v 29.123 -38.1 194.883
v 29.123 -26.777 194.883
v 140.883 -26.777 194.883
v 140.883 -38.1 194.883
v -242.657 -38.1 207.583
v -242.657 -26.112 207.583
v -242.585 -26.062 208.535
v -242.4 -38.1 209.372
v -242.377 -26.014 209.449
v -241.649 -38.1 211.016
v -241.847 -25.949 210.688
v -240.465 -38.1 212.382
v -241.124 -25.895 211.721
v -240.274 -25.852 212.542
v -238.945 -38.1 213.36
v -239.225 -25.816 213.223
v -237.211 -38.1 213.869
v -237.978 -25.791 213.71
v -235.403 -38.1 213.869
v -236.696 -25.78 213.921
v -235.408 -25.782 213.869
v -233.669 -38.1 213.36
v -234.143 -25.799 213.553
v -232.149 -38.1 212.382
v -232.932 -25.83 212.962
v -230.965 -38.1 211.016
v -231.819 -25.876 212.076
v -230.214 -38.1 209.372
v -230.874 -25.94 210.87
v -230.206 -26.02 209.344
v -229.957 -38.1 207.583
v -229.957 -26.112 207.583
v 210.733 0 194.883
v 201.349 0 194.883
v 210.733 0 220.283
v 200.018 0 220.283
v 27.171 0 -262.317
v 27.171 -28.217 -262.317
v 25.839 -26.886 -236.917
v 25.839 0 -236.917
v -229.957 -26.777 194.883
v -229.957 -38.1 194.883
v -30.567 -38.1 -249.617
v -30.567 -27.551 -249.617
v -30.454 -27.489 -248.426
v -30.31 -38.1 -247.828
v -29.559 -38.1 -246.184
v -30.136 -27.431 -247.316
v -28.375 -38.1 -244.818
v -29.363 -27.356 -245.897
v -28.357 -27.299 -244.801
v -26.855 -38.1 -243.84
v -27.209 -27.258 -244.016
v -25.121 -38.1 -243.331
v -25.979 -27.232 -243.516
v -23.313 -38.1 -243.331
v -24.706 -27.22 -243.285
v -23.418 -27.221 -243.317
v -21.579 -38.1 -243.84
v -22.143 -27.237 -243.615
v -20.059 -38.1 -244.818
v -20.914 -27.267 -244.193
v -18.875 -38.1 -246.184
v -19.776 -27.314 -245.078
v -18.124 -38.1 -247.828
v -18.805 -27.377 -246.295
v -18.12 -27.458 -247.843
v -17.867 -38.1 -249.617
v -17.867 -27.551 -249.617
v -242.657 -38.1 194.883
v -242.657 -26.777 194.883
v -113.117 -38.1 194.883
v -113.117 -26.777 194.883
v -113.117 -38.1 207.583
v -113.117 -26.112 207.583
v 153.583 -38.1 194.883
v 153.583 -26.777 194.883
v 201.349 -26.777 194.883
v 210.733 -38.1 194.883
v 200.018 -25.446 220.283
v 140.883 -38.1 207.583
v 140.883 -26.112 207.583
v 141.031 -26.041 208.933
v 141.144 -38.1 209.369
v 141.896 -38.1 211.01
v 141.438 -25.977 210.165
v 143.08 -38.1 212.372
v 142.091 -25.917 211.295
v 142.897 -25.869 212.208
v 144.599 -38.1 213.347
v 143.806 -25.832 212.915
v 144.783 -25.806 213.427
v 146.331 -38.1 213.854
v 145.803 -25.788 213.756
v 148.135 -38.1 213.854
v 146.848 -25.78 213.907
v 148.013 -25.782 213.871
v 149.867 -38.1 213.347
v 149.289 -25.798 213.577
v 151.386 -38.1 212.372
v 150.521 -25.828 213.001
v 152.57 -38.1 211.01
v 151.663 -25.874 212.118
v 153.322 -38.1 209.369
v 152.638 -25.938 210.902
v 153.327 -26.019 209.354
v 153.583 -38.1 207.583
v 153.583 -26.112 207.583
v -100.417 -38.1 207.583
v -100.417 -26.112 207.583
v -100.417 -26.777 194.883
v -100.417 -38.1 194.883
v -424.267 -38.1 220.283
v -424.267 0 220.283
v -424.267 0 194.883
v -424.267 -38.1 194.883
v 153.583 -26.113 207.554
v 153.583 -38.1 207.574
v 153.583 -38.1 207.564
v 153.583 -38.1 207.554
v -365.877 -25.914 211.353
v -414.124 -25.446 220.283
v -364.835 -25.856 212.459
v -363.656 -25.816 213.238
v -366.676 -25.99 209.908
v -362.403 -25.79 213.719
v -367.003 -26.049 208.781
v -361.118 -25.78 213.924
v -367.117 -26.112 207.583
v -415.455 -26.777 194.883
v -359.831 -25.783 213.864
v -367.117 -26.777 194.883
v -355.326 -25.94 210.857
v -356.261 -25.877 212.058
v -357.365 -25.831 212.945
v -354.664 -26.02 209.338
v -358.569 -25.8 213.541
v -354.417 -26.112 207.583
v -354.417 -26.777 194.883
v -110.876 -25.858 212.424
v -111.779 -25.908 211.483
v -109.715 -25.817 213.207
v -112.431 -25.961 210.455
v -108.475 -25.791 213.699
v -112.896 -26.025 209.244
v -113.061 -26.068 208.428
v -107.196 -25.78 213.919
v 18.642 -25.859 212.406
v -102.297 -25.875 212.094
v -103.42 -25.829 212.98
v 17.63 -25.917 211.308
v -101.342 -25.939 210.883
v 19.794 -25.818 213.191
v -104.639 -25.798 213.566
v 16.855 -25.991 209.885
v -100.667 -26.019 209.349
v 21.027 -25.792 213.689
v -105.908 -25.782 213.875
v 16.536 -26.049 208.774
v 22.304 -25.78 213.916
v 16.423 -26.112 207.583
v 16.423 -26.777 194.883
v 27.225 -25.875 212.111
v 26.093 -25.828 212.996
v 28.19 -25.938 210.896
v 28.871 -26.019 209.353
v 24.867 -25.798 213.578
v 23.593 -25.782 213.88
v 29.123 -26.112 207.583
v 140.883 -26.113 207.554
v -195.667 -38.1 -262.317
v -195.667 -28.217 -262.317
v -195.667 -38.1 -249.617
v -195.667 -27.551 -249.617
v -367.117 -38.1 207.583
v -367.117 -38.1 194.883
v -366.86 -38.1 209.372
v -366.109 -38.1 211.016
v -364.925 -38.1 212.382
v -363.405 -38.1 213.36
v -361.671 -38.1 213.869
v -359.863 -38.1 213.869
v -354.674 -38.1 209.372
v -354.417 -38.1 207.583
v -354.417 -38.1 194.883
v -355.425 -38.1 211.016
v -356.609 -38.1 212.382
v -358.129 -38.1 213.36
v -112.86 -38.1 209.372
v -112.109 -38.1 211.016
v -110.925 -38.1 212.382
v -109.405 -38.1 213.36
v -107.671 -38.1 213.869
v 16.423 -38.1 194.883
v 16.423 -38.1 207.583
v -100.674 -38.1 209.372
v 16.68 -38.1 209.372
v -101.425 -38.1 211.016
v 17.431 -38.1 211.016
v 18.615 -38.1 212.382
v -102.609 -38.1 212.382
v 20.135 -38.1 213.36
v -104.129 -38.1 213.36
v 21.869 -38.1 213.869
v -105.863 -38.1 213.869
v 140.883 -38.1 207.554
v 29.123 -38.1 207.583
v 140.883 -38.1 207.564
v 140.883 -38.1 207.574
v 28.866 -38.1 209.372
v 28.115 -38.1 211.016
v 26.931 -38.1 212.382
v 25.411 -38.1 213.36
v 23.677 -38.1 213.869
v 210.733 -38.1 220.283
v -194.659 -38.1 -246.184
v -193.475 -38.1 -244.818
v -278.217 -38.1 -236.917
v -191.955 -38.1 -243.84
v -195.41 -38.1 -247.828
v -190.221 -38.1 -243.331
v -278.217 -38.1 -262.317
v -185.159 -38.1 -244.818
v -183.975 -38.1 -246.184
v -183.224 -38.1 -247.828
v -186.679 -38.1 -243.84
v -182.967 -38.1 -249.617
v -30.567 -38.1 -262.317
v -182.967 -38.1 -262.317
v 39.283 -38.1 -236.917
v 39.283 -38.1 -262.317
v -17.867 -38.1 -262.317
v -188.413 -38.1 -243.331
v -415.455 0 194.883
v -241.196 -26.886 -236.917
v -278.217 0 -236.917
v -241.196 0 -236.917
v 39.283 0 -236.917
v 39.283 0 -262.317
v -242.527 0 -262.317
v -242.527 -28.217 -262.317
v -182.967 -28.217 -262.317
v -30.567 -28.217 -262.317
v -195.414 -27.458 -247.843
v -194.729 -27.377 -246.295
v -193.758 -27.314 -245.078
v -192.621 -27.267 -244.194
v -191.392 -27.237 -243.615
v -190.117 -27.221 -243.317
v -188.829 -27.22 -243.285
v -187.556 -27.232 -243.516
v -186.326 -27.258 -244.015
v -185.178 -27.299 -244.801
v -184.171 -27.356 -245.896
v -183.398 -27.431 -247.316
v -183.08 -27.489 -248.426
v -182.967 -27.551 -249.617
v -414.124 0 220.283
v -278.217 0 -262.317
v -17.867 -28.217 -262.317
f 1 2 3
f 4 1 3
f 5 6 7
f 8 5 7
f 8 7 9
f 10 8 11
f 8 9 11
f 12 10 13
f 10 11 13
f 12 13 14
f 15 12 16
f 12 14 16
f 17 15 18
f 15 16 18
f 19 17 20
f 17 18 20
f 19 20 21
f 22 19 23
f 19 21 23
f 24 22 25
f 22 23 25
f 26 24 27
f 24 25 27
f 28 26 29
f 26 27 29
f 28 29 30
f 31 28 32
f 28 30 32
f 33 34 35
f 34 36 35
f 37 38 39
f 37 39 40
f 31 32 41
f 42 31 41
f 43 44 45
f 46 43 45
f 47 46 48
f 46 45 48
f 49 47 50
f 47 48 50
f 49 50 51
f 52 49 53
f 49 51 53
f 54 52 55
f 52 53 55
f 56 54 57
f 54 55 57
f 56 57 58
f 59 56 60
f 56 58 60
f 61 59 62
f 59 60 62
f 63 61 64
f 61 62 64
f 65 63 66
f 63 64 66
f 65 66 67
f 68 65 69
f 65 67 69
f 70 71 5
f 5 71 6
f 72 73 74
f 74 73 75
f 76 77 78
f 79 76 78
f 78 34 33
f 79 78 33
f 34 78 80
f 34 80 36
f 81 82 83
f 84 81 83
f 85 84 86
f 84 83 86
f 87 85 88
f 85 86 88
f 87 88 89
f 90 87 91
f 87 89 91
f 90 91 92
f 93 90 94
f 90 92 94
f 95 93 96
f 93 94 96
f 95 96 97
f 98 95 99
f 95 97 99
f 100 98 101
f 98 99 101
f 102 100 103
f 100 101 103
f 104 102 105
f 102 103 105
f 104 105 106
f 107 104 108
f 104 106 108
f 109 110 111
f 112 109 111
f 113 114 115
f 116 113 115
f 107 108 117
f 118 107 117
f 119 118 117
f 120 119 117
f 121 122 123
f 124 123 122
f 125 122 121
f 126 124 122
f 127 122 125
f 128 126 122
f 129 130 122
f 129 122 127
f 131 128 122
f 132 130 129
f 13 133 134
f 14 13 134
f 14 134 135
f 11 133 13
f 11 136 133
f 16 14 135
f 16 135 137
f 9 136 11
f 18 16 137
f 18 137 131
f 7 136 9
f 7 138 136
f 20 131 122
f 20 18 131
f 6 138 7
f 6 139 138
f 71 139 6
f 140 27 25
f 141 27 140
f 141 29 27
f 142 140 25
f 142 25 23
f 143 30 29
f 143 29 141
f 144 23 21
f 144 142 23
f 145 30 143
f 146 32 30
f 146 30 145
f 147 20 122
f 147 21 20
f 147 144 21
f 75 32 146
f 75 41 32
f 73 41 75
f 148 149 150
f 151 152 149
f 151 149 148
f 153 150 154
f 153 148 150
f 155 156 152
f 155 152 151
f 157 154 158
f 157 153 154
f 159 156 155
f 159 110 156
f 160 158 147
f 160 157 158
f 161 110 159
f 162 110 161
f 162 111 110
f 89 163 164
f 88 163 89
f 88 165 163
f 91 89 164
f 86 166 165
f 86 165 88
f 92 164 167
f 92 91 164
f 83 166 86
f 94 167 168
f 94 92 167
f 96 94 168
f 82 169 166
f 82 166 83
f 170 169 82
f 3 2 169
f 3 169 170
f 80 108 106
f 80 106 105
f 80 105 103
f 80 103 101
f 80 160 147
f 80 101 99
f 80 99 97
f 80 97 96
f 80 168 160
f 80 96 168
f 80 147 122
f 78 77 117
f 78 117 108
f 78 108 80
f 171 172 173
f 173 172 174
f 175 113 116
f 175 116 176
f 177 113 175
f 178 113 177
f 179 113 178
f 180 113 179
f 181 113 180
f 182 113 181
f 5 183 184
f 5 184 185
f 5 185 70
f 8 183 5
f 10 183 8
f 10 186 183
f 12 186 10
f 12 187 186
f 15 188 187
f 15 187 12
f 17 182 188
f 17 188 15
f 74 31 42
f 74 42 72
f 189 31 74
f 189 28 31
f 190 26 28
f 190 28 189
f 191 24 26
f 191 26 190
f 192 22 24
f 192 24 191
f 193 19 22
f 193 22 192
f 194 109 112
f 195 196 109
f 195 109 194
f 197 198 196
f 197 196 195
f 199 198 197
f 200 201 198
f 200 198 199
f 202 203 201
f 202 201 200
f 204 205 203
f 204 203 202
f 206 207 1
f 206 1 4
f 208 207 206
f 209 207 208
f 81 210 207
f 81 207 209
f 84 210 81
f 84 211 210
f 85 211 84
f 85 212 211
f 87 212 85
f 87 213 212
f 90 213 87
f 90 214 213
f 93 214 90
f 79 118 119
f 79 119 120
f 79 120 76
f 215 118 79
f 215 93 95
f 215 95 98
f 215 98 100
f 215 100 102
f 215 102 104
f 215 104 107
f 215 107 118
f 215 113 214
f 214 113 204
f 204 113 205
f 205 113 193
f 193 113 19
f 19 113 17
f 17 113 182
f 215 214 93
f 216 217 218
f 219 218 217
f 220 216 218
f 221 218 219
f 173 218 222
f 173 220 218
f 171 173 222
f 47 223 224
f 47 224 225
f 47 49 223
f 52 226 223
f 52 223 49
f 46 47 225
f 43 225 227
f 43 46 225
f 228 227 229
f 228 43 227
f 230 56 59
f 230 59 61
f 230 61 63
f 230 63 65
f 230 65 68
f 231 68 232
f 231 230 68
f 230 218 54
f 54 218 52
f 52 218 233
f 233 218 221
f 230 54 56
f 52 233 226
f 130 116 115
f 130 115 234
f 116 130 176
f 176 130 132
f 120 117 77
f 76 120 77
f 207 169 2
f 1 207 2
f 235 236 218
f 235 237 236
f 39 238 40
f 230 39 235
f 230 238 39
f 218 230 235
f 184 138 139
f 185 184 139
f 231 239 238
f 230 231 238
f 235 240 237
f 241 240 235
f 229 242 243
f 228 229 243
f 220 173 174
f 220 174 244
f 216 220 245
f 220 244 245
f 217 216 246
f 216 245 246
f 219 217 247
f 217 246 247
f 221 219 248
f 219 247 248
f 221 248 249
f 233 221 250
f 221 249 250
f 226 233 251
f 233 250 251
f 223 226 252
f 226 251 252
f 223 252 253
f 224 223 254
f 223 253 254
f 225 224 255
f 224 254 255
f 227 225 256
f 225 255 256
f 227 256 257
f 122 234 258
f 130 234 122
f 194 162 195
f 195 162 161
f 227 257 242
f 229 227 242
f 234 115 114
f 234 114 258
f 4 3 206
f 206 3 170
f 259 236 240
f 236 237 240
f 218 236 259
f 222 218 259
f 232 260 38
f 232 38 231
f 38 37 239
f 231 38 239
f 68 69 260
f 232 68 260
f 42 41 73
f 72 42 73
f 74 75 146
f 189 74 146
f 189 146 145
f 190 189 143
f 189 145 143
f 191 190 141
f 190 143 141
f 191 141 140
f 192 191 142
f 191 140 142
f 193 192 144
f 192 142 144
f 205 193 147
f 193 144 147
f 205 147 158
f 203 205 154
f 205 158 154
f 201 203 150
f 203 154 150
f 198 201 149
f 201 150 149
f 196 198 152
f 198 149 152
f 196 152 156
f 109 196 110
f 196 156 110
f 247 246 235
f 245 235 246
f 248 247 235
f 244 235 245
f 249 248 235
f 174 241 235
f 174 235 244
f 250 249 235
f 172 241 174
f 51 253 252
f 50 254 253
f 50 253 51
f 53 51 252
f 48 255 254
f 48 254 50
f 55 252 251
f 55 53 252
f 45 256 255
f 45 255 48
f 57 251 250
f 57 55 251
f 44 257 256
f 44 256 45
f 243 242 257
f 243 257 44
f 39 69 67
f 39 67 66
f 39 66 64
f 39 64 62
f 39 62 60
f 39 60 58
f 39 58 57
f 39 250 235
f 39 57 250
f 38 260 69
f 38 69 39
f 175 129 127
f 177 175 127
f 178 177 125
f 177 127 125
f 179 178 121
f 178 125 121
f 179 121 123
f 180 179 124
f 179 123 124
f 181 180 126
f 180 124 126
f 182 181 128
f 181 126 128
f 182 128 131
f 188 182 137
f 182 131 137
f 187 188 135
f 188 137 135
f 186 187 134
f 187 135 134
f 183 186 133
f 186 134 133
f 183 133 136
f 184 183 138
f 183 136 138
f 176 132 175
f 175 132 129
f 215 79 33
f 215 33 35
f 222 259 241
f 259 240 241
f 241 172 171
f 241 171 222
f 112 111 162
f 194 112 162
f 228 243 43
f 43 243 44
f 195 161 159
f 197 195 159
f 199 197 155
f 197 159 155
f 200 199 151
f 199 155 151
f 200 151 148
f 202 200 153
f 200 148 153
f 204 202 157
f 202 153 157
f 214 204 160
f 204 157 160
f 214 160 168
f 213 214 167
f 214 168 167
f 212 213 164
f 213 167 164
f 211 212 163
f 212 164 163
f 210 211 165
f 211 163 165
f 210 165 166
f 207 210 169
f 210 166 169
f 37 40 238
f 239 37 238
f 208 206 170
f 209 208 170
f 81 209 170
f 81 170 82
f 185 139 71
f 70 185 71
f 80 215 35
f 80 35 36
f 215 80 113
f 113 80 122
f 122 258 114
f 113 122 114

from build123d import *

# Parameters (mm, degrees)
F0_W     = 12.7
F0_H     = 25.4
F1_DEPTH = 38.1
F2_W     = 614.1419559717
F2_H     = 25.4462901503
F3_DEPTH = 25.4
F3_TAPER = -3
F4_W     = 267.035773024
F4_H     = 26.885855943
F5_DEPTH = 25.4
F5_TAPER = -3
F6_DEPTH = 25.4


# Not quite as in the source:
# - a feature of the source that left no trace in its solid (it failed there, or was rolled back) is left out


with BuildPart() as f1:
    # F0 (on Front) → F1 (new body)
    with BuildSketch(Plane.XZ):
        with Locations((204.3829661512, 207.5833906111)):
            Rectangle(F0_W, F0_H)
        with BuildLine():
            ThreePointArc((-367.1170338488, 207.5833906111), (-360.7670338488, 213.9333906111), (-354.4170338488, 207.5833906111))
            Line((-354.4170338488, 207.5833906111), (-354.4170338488, 194.8833906111))
            Line((-354.4170338488, 194.8833906111), (-242.6570338488, 194.8833906111))
            Line((-242.6570338488, 194.8833906111), (-242.6570338488, 207.5833906111))
            ThreePointArc((-242.6570338488, 207.5833906111), (-236.3070338488, 213.9333906111), (-229.9570338488, 207.5833906111))
            Line((-229.9570338488, 207.5833906111), (-229.9570338488, 194.8833906111))
            Line((-229.9570338488, 194.8833906111), (-113.1170338488, 194.8833906111))
            Line((-113.1170338488, 194.8833906111), (-113.1170338488, 207.5833906111))
            ThreePointArc((-113.1170338488, 207.5833906111), (-106.7670338488, 213.9333906111), (-100.4170338488, 207.5833906111))
            Line((-100.4170338488, 207.5833906111), (-100.4170338488, 194.8833906111))
            Line((-100.4170338488, 194.8833906111), (16.4229661512, 194.8833906111))
            Line((16.4229661512, 194.8833906111), (16.4229661512, 207.5833906111))
            ThreePointArc((16.4229661512, 207.5833906111), (22.7729661512, 213.9333906111), (29.1229661512, 207.5833906111))
            Line((29.1229661512, 207.5833906111), (29.1229661512, 194.8833906111))
            Line((29.1229661512, 194.8833906111), (140.8829827985, 194.8833906111))
            Line((140.8829827985, 194.8833906111), (140.8829827985, 207.5543100772))
            ThreePointArc((140.8829827985, 207.5543100772), (140.8829661512, 207.5688503442), (140.8829827985, 207.5833906112))
            ThreePointArc((140.8829827985, 207.5833906112), (147.2329661512, 213.9188503442), (153.582949504, 207.5833906111))
            ThreePointArc((153.582949504, 207.5833906111), (153.5829661512, 207.5688503442), (153.582949504, 207.5543100772))
            Line((153.582949504, 207.5543100772), (153.582949504, 194.8833906111))
            Line((153.582949504, 194.8833906111), (198.0329661512, 194.8833906111))
            Line((198.0329661512, 194.8833906111), (198.0329661512, 220.2833906111))
            Line((198.0329661512, 220.2833906111), (-411.5670338488, 220.2833906111))
            Line((-411.5670338488, 220.2833906111), (-424.2670338488, 220.2833906111))
            Line((-424.2670338488, 220.2833906111), (-424.2670338488, 194.8833906111))
            Line((-424.2670338488, 194.8833906111), (-411.5670338488, 194.8833906111))
            Line((-411.5670338488, 194.8833906111), (-367.1170338488, 194.8833906111))
            Line((-367.1170338488, 194.8833906111), (-367.1170338488, 207.5833906111))
        make_face()
    extrude(amount=F1_DEPTH)

    # F2 (on face) → F3 (cut)
    with BuildSketch(Plane.XY.offset(220.2833906111)):
        with Locations((-107.0529446006, -12.7231450751)):
            Rectangle(F2_W, F2_H)
    extrude(amount=-F3_DEPTH, taper=F3_TAPER, mode=Mode.SUBTRACT)


with BuildPart() as f1b:
    # F0 (on Front) → F1, piece 2 (new body)
    with BuildSketch(Plane.XZ):
        with BuildLine():
            ThreePointArc((-195.6670338488, -249.6166093889), (-189.3170338488, -243.2666093889), (-182.9670338488, -249.6166093889))
            Line((-182.9670338488, -249.6166093889), (-182.9670338488, -262.3166093889))
            Line((-182.9670338488, -262.3166093889), (-30.5670338488, -262.3166093889))
            Line((-30.5670338488, -262.3166093889), (-30.5670338488, -249.6166093889))
            ThreePointArc((-30.5670338488, -249.6166093889), (-24.2170338488, -243.2666093889), (-17.8670338488, -249.6166093889))
            Line((-17.8670338488, -249.6166093889), (-17.8670338488, -262.3166093889))
            Line((-17.8670338488, -262.3166093889), (39.2829661512, -262.3166093889))
            Line((39.2829661512, -262.3166093889), (39.2829661512, -236.9166093889))
            Line((39.2829661512, -236.9166093889), (-252.8170338488, -236.9166093889))
            Line((-252.8170338488, -236.9166093889), (-252.8170338488, -262.3166093889))
            Line((-252.8170338488, -262.3166093889), (-195.6670338488, -262.3166093889))
            Line((-195.6670338488, -262.3166093889), (-195.6670338488, -249.6166093889))
        make_face()
    extrude(amount=F1_DEPTH)

    # F4 (on face) → F5 (cut)
    with BuildSketch(Plane.XY.offset(-236.9166093889)):
        with Locations((-107.6784180477, -13.4429279715)):
            Rectangle(F4_W, F4_H)
    extrude(amount=-F5_DEPTH, taper=F5_TAPER, mode=Mode.SUBTRACT)

    # F6 (add): a face of the model
    f6_faces = [f1b.faces().sort_by_distance(p)[0] for p in [
        (-252.8170338488, -19.05, -249.6166093889),
    ]]
    extrude(f6_faces, amount=F6_DEPTH)


solid = Compound([f1.part, f1b.part])
